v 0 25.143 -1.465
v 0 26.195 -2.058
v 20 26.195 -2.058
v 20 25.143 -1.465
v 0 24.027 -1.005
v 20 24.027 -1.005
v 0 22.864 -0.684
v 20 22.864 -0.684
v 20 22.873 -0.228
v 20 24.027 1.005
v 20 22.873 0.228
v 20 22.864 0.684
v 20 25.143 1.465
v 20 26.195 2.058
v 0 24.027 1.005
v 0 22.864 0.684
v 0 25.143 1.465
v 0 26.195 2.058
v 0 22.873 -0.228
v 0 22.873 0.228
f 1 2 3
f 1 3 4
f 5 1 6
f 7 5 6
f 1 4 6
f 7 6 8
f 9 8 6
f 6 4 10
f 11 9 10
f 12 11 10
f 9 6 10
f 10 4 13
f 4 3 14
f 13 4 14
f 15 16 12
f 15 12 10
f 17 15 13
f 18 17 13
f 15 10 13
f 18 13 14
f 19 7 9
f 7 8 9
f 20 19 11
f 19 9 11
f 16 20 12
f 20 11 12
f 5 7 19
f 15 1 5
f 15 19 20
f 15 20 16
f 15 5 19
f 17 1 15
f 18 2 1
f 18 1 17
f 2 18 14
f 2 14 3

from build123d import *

# Parameters (mm, degrees)
BASPROSKE_W     = 20
BASPROSKE_H     = 26.25
TOOTHCUT_DEPTH  = 43.167819484
TEETHCUTS_COUNT = 33
TEETHCUTS_ANGLE = 349.090909091
BORSKE_R        = 15
BORE_DEPTH      = 50.0000508
KEYSKE_W        = 10
KEYSKE_H        = 18.3
KEYWAY_DEPTH    = 50.0000508
EXTRUDE_START   = 1
SKETCH_1_R      = 28
EXTRUDE_2_DEPTH = 1
SKETCH_2_R      = 28
EXTRUDE_3_DEPTH = 1
EXTRUDE_4_DEPTH = 10


with BuildPart() as part:
    # BasProSke → Base-Revolve (revolve)
    with BuildSketch(Plane(origin=(0, 0, 0), x_dir=(1, 0, 0), z_dir=(0, 1, 0)), mode=Mode.PRIVATE) as base_revolve_sk:
        with Locations((10, 13.125)):
            Rectangle(BASPROSKE_W, BASPROSKE_H)
    revolve(base_revolve_sk.sketch.rotate(Axis((-10, 0, 0), (1, 0, 0)), 180), axis=Axis((-10, 0, 0), (1, 0, 0)))

    # TooCutSke → ToothCut (cut, through all)
    with BuildSketch(Plane(origin=(0, 0, 0), x_dir=(0, 0, -1), z_dir=(1, 0, 0))):
        with BuildLine():
            ThreePointArc((0.683690741, 22.863780155), (0, 22.874), (-0.683690741, 22.863780155))
            ThreePointArc((-0.683690741, 22.863780155), (-1.217783987, 24.592276227), (-2.057504394, 26.194719331))
            ThreePointArc((-2.057504394, 26.194719331), (0, 26.2754), (2.057504394, 26.194719331))
            ThreePointArc((2.057504394, 26.194719331), (1.217783987, 24.592276227), (0.683690741, 22.863780155))
        make_face()
    toothcut = extrude(amount=TOOTHCUT_DEPTH, mode=Mode.SUBTRACT)

    # TeethCuts: ToothCut ×33 about axis
    teethcuts_axis = Axis((-10, 0, 0), (1, 0, 0))
    for i in range(1, TEETHCUTS_COUNT):
        add(toothcut.rotate(teethcuts_axis, i * TEETHCUTS_ANGLE / (TEETHCUTS_COUNT - 1)), mode=Mode.SUBTRACT)

    # BorSke → Bore (cut, symmetric)
    with BuildSketch(Plane(origin=(0, 0, 0), x_dir=(0, 0, -1), z_dir=(1, 0, 0))):
        with Locations(Location((0, 0, 0), (0, 0, 180))):
            Circle(BORSKE_R)
    extrude(amount=BORE_DEPTH, both=True, mode=Mode.SUBTRACT)

    # KeySke → Keyway (cut, symmetric)
    with BuildSketch(Plane(origin=(0, 0, 0), x_dir=(0, 0, -1), z_dir=(1, 0, 0))):
        with Locations((0, 9.15)):
            Rectangle(KEYSKE_W, KEYSKE_H)
    extrude(amount=KEYWAY_DEPTH, both=True, mode=Mode.SUBTRACT)

    # Эскиз1 → Бобышка-Вытянуть2 (add)
    with BuildSketch(Plane(origin=(20, 0, 0), x_dir=(0, 0, -1), z_dir=(1, 0, 0)).offset(EXTRUDE_START)):
        Circle(SKETCH_1_R)
        with BuildLine():
            Line((5, 18.3), (-5, 18.3))
            Line((-5, 18.3), (-5, 14.142135624))
            ThreePointArc((-5, 14.142135624), (0, -15), (5, 14.142135624))
            Line((5, 14.142135624), (5, 18.3))
        make_face(mode=Mode.SUBTRACT)
    extrude(amount=-EXTRUDE_2_DEPTH)

    # Эскиз2 → Бобышка-Вытянуть3 (add)
    with BuildSketch(Plane.ZY):
        with Locations(Location((0, 0, 0), (0, 0, 180))):
            Circle(SKETCH_2_R)
        with BuildLine():
            Line((-5, 18.3), (-5, 14.142135624))
            ThreePointArc((-5, 14.142135624), (0, -15), (5, 14.142135624))
            Line((5, 14.142135624), (5, 18.3))
            Line((5, 18.3), (-5, 18.3))
        make_face(mode=Mode.SUBTRACT)
    extrude(amount=EXTRUDE_3_DEPTH)


with BuildPart() as body_2:
    # Эскиз4 → Бобышка-Вытянуть4 (new, symmetric)
    with BuildSketch(Plane(origin=(10, 0, 0), x_dir=(0, 0, -1), z_dir=(1, 0, 0))):
        with BuildLine():
            Line((-2.057504394, 26.194719331), (2.057504394, 26.194719331))
            ThreePointArc((2.057504394, 26.194719331), (1.217783987, 24.592276227), (0.683690741, 22.863780155))
            ThreePointArc((0.683690741, 22.863780155), (0, 22.874), (-0.683690741, 22.863780155))
            ThreePointArc((-0.683690741, 22.863780155), (-1.217783987, 24.592276227), (-2.057504394, 26.194719331))
        make_face()
    extrude(amount=EXTRUDE_4_DEPTH, both=True)


solid = body_2.part
